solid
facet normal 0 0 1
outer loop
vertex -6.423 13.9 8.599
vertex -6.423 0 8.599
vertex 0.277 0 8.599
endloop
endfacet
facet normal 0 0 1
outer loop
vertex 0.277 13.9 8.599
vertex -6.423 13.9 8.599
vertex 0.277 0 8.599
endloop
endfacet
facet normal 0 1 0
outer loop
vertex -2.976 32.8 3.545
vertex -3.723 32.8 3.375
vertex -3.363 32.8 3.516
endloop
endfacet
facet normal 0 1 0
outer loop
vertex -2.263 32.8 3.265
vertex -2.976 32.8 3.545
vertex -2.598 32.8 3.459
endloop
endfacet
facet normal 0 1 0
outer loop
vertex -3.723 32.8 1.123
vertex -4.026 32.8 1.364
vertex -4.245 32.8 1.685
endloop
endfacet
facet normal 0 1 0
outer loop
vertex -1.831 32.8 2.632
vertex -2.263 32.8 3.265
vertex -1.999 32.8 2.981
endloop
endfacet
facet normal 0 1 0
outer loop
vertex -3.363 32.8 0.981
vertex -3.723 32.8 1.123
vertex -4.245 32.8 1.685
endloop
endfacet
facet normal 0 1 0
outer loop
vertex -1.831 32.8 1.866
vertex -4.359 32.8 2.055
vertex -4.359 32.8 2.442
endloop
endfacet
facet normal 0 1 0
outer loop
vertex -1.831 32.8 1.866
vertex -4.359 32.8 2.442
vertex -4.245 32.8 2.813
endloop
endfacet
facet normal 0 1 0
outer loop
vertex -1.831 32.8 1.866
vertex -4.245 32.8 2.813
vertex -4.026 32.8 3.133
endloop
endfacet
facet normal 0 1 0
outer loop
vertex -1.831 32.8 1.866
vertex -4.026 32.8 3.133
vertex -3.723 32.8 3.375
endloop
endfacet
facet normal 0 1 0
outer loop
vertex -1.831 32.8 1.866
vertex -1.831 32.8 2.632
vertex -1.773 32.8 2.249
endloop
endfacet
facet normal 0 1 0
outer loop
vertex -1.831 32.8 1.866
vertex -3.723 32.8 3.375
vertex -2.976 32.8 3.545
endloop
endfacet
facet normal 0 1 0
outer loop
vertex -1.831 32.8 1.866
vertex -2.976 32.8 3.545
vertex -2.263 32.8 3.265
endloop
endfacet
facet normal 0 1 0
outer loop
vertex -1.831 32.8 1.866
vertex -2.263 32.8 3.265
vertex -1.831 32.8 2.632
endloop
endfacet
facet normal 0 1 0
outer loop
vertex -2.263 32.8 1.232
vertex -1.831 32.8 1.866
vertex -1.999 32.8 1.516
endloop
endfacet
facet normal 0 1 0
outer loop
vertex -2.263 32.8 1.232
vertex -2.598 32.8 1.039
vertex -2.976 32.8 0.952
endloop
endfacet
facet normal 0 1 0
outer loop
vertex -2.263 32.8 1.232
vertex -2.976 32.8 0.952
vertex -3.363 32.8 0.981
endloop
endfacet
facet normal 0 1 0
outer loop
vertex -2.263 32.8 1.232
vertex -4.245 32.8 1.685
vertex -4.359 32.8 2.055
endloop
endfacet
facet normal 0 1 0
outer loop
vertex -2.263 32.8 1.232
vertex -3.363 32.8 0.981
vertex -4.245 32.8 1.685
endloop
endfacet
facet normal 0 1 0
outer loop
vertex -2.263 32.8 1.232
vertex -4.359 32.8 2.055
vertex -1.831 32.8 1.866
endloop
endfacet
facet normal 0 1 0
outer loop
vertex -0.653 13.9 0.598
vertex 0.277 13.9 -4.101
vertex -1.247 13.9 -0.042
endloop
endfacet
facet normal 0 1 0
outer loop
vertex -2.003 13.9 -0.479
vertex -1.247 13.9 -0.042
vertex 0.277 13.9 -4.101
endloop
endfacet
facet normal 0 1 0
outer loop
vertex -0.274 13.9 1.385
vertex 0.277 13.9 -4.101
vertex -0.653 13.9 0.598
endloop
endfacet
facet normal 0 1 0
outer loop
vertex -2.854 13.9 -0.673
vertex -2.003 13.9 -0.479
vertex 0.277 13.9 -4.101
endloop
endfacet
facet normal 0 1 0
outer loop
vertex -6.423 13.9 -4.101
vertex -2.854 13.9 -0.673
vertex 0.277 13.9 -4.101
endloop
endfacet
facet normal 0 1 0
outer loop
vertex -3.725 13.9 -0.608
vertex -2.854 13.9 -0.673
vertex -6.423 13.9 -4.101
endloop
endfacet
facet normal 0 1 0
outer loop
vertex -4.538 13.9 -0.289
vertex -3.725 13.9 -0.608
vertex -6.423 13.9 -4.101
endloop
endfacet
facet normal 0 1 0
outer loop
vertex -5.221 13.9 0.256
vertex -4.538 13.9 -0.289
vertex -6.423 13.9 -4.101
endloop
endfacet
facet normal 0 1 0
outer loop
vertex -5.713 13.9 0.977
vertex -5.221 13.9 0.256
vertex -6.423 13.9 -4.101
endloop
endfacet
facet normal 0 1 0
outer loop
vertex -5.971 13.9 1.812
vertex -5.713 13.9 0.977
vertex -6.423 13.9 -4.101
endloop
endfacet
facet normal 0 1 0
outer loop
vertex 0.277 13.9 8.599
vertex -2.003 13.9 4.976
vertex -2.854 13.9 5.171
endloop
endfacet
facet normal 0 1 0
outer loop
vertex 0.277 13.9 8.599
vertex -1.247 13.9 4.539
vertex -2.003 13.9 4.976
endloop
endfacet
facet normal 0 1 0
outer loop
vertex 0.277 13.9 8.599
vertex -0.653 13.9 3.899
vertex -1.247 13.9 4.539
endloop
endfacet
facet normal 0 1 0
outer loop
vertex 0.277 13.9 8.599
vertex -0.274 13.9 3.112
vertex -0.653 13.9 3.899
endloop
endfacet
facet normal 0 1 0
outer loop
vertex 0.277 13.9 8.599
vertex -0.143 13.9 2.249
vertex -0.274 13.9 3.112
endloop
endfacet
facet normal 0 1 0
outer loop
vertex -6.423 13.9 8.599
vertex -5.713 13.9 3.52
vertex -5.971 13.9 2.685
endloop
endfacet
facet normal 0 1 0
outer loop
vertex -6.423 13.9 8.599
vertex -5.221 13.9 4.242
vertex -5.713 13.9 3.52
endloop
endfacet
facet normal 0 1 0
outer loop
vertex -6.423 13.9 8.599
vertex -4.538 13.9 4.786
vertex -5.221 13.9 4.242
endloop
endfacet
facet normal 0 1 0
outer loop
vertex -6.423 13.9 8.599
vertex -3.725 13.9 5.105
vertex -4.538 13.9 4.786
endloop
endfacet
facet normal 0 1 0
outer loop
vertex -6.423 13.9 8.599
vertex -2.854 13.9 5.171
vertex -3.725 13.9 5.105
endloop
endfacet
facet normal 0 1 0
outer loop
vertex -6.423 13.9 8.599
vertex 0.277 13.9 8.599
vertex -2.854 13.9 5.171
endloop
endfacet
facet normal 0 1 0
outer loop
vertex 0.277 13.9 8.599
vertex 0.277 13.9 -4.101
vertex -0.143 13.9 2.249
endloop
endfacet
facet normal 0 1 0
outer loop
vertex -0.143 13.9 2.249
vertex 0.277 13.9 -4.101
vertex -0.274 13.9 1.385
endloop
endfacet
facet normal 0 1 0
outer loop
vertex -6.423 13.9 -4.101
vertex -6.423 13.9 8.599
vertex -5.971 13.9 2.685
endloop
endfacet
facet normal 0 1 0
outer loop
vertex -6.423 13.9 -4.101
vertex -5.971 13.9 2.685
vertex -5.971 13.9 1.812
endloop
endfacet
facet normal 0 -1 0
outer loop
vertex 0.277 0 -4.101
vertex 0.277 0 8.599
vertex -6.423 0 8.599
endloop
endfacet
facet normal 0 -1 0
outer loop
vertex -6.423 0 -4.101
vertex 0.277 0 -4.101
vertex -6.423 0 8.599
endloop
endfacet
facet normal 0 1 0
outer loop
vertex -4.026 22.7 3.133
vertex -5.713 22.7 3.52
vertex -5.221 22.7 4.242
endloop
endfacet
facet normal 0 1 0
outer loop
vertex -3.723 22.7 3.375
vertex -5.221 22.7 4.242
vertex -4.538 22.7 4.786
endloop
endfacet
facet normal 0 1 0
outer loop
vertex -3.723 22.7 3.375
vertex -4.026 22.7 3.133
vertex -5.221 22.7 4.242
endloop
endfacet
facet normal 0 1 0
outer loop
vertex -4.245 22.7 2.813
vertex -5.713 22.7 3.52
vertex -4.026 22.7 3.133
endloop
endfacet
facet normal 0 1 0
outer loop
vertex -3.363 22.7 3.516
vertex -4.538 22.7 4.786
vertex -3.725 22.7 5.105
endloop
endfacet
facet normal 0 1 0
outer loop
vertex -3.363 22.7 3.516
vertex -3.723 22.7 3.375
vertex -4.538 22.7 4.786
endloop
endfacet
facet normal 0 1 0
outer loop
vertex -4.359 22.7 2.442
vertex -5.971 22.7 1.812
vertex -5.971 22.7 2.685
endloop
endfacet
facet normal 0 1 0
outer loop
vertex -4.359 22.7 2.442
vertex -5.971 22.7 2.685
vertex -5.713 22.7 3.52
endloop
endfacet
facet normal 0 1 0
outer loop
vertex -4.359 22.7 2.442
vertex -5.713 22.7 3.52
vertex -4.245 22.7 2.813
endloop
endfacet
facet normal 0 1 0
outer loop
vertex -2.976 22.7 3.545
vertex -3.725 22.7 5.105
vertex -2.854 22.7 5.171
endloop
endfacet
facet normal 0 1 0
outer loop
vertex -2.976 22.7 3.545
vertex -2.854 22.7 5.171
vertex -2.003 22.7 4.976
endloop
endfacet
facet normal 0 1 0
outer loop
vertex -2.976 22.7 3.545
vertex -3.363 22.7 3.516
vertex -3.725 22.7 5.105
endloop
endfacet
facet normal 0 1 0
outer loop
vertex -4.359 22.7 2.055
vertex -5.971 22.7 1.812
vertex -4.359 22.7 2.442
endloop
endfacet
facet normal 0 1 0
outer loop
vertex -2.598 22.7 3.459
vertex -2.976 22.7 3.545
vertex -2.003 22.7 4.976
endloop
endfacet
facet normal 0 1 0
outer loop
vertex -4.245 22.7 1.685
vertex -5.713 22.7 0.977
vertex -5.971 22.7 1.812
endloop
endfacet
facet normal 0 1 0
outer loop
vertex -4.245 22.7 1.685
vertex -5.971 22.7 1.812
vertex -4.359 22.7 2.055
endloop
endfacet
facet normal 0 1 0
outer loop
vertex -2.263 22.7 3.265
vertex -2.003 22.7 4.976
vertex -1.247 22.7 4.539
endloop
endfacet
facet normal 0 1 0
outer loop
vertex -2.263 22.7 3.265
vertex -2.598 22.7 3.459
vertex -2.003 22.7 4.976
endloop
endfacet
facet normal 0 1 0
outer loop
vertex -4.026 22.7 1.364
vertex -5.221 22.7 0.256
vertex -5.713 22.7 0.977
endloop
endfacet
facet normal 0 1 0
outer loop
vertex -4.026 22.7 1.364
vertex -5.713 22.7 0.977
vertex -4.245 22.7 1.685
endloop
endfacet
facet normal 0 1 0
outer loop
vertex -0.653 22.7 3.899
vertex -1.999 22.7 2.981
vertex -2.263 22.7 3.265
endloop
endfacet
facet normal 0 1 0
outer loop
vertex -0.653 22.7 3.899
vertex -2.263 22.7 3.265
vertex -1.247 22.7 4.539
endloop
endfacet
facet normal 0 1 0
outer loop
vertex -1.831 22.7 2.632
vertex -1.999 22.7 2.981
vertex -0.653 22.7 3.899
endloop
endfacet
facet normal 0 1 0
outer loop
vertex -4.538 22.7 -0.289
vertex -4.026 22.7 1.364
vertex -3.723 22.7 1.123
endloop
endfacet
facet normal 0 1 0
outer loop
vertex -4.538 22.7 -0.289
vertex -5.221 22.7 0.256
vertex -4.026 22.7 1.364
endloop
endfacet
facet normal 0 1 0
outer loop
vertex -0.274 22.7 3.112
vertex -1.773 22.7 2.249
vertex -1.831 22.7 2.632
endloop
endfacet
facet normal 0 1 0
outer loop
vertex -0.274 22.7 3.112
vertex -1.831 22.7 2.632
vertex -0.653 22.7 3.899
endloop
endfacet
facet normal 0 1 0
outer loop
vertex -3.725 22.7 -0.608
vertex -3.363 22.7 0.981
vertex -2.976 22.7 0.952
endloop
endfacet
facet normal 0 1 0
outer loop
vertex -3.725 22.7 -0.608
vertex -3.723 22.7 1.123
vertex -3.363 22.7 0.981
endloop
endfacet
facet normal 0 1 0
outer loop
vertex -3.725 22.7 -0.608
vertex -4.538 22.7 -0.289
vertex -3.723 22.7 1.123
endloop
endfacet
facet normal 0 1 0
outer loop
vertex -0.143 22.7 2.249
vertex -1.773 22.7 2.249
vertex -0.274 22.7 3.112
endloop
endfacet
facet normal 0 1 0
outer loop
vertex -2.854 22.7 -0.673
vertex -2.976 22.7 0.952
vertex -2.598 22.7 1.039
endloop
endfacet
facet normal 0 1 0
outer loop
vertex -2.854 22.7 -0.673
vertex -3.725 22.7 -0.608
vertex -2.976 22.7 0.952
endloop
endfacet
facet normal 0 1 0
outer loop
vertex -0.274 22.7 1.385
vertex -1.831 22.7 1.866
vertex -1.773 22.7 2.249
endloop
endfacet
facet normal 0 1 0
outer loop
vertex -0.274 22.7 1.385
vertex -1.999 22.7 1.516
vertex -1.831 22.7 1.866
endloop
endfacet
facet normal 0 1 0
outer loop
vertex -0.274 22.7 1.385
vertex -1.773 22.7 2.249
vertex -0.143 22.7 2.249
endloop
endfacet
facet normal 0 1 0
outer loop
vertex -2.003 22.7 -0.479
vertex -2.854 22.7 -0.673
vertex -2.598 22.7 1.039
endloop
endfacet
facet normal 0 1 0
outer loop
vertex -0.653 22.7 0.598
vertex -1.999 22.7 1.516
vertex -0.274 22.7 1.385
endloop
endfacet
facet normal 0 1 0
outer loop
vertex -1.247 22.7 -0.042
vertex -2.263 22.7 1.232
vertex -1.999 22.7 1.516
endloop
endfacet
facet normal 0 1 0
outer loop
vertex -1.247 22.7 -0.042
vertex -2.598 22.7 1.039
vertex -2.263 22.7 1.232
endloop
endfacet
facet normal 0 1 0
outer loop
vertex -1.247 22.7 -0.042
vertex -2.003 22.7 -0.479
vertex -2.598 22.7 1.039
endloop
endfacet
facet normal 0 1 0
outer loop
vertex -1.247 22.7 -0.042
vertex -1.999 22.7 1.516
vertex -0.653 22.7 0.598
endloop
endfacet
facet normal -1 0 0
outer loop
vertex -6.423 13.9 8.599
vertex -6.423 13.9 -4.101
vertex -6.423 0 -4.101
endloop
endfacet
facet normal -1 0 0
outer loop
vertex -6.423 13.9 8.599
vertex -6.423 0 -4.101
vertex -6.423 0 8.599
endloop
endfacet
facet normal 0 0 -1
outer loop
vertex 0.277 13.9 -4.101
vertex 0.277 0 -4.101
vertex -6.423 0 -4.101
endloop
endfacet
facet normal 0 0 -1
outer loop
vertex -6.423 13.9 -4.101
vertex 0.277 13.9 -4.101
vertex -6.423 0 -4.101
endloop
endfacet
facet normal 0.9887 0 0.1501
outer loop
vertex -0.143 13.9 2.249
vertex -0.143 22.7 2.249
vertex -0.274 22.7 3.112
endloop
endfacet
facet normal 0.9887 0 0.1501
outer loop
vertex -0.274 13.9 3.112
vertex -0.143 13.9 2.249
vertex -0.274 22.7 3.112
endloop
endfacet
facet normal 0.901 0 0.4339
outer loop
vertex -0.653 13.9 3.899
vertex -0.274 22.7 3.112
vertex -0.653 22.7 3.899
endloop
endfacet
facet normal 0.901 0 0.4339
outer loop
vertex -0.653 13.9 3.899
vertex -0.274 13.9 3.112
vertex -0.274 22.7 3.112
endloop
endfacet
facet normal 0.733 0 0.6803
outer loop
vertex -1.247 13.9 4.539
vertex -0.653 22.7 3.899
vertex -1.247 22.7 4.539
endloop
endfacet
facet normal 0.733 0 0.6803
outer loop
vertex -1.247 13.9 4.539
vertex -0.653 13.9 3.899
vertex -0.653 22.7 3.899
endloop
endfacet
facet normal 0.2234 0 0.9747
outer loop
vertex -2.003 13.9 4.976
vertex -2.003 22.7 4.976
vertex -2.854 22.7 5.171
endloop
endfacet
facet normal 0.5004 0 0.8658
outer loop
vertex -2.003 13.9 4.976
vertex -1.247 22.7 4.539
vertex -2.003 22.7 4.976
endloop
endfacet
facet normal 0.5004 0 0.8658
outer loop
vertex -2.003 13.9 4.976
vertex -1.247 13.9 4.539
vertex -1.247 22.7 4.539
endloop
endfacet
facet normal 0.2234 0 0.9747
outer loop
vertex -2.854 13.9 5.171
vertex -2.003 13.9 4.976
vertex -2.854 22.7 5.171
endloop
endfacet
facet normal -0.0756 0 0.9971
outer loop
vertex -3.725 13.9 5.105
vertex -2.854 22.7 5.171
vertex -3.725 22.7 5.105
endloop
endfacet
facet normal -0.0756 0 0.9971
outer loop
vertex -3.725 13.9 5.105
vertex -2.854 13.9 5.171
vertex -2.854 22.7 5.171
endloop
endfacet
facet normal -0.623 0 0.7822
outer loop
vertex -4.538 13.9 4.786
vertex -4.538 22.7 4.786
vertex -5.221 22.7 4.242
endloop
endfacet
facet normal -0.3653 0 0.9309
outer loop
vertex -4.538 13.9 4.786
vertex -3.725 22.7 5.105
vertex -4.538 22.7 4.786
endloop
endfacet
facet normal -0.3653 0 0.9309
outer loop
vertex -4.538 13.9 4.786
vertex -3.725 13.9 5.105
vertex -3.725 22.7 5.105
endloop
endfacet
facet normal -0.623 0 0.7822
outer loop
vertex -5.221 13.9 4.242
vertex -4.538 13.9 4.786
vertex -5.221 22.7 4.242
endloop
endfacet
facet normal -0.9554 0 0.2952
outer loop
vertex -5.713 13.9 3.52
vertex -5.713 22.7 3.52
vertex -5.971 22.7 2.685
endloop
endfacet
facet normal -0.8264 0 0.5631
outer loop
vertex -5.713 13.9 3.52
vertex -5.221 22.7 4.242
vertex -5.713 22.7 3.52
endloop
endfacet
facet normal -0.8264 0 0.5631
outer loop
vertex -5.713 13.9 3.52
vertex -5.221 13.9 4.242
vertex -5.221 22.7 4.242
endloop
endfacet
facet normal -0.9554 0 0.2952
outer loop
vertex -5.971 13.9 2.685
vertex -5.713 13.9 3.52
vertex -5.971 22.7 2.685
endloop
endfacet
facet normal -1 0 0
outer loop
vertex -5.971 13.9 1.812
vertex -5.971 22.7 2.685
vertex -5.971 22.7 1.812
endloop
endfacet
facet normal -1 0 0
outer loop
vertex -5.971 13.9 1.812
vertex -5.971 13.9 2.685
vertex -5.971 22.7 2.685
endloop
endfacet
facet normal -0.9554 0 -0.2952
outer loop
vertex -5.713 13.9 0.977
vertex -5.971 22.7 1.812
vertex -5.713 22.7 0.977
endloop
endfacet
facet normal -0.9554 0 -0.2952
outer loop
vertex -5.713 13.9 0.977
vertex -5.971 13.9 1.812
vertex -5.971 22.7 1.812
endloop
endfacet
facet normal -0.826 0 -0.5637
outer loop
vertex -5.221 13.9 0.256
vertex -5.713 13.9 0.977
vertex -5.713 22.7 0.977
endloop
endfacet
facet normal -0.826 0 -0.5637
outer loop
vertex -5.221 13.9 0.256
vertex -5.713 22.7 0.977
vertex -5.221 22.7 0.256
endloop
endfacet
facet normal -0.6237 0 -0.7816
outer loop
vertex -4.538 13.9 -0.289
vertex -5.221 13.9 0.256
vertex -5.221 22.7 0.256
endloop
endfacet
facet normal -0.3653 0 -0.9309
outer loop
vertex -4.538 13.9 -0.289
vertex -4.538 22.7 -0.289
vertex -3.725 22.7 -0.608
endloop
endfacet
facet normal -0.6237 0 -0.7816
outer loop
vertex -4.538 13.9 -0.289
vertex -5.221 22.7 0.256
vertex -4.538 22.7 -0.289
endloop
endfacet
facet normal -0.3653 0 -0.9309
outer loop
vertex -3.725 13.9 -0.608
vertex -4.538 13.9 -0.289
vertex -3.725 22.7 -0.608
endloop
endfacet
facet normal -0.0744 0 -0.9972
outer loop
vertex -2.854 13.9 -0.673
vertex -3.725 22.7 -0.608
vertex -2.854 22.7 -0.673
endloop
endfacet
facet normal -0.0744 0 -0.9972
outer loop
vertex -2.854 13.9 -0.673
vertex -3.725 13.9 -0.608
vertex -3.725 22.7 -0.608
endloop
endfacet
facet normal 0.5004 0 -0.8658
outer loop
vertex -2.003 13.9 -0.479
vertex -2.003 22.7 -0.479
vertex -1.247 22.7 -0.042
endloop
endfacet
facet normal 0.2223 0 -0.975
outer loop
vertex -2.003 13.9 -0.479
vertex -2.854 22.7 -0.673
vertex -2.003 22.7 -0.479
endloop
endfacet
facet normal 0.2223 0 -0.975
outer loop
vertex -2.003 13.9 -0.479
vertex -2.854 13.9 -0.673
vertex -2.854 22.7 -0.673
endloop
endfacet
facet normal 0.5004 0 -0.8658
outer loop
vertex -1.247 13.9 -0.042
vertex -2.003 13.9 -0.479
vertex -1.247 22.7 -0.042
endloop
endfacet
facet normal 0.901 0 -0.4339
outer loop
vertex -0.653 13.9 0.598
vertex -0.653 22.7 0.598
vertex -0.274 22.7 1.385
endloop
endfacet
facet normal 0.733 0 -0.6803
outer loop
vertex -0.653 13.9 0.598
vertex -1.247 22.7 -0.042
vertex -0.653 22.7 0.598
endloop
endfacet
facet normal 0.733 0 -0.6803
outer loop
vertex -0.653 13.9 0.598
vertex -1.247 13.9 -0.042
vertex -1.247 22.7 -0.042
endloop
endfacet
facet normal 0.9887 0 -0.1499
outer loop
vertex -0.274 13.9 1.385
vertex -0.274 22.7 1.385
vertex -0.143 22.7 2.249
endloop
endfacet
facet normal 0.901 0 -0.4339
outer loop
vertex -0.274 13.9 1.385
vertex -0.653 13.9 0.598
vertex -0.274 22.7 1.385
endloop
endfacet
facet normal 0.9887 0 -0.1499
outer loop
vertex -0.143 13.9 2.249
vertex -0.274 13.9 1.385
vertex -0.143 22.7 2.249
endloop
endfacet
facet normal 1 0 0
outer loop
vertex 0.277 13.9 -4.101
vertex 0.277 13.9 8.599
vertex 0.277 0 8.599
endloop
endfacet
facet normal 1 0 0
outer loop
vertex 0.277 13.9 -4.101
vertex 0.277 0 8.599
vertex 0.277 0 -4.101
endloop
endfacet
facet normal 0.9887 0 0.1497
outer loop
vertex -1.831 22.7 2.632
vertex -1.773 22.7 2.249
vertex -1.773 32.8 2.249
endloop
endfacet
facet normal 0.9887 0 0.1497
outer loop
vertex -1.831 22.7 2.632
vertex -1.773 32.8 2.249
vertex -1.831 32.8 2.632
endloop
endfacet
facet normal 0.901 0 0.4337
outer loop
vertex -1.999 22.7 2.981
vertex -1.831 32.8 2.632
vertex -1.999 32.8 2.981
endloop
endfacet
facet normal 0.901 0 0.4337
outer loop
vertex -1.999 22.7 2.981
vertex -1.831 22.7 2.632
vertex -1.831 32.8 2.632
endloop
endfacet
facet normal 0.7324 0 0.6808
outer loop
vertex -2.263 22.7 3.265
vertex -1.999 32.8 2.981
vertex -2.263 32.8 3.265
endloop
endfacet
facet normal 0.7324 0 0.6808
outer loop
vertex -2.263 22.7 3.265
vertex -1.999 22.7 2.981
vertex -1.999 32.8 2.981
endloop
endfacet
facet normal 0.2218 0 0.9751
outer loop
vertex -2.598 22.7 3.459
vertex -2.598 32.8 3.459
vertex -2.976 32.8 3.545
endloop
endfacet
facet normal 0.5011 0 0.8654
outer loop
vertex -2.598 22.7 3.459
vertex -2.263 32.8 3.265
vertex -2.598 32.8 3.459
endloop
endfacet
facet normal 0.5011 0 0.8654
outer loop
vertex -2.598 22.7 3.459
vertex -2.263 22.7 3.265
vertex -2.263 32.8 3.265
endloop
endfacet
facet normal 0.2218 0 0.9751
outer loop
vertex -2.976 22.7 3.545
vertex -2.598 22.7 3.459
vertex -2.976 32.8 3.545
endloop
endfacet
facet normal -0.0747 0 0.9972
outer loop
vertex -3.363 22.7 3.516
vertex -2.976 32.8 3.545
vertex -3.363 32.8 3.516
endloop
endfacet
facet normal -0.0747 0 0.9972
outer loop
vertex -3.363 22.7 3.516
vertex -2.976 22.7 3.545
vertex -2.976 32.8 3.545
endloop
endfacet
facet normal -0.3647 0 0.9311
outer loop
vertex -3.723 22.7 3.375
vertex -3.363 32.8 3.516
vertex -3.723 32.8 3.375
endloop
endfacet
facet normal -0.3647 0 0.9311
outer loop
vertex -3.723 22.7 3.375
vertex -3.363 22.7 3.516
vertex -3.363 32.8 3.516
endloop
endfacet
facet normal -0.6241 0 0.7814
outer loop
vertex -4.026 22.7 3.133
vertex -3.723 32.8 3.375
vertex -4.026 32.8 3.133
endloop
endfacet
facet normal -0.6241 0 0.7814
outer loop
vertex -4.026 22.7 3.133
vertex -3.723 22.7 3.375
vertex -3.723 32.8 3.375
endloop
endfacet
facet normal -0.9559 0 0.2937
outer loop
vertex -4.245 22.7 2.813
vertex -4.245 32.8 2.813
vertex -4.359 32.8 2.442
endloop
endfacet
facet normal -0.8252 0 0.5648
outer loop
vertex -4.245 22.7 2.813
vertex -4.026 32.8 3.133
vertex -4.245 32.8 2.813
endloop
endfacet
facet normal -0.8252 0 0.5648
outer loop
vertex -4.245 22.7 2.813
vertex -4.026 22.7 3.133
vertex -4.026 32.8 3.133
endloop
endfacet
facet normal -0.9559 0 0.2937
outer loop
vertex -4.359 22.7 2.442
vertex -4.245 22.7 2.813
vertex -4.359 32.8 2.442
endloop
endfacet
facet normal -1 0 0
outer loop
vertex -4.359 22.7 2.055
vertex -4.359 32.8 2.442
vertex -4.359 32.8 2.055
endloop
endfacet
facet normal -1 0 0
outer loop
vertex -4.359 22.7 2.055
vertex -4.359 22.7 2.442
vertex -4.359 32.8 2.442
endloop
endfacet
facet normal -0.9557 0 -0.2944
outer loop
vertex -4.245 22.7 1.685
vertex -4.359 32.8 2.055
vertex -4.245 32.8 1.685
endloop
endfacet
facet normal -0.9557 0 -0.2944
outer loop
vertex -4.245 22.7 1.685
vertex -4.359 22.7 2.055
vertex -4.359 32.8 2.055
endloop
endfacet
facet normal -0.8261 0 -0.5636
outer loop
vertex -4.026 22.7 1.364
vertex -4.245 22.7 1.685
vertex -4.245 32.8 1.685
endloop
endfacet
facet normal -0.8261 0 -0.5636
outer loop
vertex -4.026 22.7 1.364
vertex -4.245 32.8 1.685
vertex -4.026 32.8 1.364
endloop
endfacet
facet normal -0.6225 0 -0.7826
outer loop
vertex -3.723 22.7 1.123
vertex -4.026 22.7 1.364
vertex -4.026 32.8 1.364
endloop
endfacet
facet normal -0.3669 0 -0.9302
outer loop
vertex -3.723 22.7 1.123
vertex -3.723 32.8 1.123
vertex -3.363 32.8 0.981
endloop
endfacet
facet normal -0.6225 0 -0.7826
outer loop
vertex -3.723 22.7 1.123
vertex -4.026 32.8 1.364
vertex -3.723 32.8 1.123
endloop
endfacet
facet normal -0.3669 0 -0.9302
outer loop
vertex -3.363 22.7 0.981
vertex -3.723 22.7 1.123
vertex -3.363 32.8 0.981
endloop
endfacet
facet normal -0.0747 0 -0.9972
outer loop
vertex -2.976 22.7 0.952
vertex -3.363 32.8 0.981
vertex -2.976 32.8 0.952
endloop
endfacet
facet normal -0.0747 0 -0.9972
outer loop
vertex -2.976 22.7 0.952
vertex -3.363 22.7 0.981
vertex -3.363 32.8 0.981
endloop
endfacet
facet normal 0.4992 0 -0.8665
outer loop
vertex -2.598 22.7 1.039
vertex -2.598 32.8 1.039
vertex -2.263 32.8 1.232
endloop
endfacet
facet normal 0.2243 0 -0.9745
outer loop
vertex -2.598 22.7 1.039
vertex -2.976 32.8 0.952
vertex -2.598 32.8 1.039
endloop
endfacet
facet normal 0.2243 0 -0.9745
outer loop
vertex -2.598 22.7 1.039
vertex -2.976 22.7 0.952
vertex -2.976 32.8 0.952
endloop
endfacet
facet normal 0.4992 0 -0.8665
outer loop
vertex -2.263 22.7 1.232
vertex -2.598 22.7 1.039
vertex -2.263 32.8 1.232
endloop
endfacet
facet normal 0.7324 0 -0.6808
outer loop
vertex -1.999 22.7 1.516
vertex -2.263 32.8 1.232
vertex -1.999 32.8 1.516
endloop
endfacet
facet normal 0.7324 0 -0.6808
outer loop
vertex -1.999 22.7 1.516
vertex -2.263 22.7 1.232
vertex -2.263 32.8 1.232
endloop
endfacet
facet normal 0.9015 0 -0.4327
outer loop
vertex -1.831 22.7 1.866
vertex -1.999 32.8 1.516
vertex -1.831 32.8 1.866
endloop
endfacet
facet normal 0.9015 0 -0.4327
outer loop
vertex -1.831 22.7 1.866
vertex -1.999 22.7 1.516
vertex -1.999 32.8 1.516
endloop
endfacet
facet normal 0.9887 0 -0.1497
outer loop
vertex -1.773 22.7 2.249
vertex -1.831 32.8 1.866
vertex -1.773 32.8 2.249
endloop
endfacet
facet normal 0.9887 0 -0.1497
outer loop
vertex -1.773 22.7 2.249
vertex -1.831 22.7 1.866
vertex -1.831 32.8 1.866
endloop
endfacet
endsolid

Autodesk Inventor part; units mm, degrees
ref_plane "YZ Plane" through (0, 0, 0) normal (1, 0, 0) x (0, 1, 0)
ref_plane "XZ Plane" through (0, 0, 0) normal (0, 1, 0) x (-1, 0, 0)
ref_plane "XY Plane" through (0, 0, 0) normal (0, 0, 1) x (1, 0, 0)
sketch "Sketch1" plane through (0, 0, 0) normal (0, 1, 0) x (-1, 0, 0)
  line L0 (6.4234, 8.5987) -> (-0.2766, 8.5987)
  line L1 (-0.2766, 8.5987) -> (-0.2766, -4.1013)
  line L2 (-0.2766, -4.1013) -> (6.4234, -4.1013)
  line L3 (6.4234, -4.1013) -> (6.4234, 8.5987)
  point P0 (0, 0)
  dimension "d0" = 6.7
  dimension "d1" = 12.7
extrude "Extrusion1" add sketch "Sketch1" along normal blind 13.9
sketch "Sketch2" plane through (0, 13.9, 0) normal (0, 1, 0) x (1, 0, 0)
  circle A0 centre (-3.0734, -2.2487) radius 2.93
  point P0 (0, 0)
  point P1 (-6.4234, -8.5987)
  point P2 (0.2766, -8.5987)
  point P3 (-6.4234, 4.1013)
  dimension "d4" = 5.86
extrude "Extrusion2" add sketch "Sketch2" along normal blind 8.8
sketch "Sketch3" plane through (-3.0734, 22.7, 2.2487) normal (0, 1, 0) x (1, 0, 0)
  circle A0 centre (0, 0) radius 1.3
  point P0 (3.0734, 2.2487)
  dimension "d7" = 2.6
extrude "Extrusion3" add sketch "Sketch3" along normal blind 10.1
properties part number "Switch"
